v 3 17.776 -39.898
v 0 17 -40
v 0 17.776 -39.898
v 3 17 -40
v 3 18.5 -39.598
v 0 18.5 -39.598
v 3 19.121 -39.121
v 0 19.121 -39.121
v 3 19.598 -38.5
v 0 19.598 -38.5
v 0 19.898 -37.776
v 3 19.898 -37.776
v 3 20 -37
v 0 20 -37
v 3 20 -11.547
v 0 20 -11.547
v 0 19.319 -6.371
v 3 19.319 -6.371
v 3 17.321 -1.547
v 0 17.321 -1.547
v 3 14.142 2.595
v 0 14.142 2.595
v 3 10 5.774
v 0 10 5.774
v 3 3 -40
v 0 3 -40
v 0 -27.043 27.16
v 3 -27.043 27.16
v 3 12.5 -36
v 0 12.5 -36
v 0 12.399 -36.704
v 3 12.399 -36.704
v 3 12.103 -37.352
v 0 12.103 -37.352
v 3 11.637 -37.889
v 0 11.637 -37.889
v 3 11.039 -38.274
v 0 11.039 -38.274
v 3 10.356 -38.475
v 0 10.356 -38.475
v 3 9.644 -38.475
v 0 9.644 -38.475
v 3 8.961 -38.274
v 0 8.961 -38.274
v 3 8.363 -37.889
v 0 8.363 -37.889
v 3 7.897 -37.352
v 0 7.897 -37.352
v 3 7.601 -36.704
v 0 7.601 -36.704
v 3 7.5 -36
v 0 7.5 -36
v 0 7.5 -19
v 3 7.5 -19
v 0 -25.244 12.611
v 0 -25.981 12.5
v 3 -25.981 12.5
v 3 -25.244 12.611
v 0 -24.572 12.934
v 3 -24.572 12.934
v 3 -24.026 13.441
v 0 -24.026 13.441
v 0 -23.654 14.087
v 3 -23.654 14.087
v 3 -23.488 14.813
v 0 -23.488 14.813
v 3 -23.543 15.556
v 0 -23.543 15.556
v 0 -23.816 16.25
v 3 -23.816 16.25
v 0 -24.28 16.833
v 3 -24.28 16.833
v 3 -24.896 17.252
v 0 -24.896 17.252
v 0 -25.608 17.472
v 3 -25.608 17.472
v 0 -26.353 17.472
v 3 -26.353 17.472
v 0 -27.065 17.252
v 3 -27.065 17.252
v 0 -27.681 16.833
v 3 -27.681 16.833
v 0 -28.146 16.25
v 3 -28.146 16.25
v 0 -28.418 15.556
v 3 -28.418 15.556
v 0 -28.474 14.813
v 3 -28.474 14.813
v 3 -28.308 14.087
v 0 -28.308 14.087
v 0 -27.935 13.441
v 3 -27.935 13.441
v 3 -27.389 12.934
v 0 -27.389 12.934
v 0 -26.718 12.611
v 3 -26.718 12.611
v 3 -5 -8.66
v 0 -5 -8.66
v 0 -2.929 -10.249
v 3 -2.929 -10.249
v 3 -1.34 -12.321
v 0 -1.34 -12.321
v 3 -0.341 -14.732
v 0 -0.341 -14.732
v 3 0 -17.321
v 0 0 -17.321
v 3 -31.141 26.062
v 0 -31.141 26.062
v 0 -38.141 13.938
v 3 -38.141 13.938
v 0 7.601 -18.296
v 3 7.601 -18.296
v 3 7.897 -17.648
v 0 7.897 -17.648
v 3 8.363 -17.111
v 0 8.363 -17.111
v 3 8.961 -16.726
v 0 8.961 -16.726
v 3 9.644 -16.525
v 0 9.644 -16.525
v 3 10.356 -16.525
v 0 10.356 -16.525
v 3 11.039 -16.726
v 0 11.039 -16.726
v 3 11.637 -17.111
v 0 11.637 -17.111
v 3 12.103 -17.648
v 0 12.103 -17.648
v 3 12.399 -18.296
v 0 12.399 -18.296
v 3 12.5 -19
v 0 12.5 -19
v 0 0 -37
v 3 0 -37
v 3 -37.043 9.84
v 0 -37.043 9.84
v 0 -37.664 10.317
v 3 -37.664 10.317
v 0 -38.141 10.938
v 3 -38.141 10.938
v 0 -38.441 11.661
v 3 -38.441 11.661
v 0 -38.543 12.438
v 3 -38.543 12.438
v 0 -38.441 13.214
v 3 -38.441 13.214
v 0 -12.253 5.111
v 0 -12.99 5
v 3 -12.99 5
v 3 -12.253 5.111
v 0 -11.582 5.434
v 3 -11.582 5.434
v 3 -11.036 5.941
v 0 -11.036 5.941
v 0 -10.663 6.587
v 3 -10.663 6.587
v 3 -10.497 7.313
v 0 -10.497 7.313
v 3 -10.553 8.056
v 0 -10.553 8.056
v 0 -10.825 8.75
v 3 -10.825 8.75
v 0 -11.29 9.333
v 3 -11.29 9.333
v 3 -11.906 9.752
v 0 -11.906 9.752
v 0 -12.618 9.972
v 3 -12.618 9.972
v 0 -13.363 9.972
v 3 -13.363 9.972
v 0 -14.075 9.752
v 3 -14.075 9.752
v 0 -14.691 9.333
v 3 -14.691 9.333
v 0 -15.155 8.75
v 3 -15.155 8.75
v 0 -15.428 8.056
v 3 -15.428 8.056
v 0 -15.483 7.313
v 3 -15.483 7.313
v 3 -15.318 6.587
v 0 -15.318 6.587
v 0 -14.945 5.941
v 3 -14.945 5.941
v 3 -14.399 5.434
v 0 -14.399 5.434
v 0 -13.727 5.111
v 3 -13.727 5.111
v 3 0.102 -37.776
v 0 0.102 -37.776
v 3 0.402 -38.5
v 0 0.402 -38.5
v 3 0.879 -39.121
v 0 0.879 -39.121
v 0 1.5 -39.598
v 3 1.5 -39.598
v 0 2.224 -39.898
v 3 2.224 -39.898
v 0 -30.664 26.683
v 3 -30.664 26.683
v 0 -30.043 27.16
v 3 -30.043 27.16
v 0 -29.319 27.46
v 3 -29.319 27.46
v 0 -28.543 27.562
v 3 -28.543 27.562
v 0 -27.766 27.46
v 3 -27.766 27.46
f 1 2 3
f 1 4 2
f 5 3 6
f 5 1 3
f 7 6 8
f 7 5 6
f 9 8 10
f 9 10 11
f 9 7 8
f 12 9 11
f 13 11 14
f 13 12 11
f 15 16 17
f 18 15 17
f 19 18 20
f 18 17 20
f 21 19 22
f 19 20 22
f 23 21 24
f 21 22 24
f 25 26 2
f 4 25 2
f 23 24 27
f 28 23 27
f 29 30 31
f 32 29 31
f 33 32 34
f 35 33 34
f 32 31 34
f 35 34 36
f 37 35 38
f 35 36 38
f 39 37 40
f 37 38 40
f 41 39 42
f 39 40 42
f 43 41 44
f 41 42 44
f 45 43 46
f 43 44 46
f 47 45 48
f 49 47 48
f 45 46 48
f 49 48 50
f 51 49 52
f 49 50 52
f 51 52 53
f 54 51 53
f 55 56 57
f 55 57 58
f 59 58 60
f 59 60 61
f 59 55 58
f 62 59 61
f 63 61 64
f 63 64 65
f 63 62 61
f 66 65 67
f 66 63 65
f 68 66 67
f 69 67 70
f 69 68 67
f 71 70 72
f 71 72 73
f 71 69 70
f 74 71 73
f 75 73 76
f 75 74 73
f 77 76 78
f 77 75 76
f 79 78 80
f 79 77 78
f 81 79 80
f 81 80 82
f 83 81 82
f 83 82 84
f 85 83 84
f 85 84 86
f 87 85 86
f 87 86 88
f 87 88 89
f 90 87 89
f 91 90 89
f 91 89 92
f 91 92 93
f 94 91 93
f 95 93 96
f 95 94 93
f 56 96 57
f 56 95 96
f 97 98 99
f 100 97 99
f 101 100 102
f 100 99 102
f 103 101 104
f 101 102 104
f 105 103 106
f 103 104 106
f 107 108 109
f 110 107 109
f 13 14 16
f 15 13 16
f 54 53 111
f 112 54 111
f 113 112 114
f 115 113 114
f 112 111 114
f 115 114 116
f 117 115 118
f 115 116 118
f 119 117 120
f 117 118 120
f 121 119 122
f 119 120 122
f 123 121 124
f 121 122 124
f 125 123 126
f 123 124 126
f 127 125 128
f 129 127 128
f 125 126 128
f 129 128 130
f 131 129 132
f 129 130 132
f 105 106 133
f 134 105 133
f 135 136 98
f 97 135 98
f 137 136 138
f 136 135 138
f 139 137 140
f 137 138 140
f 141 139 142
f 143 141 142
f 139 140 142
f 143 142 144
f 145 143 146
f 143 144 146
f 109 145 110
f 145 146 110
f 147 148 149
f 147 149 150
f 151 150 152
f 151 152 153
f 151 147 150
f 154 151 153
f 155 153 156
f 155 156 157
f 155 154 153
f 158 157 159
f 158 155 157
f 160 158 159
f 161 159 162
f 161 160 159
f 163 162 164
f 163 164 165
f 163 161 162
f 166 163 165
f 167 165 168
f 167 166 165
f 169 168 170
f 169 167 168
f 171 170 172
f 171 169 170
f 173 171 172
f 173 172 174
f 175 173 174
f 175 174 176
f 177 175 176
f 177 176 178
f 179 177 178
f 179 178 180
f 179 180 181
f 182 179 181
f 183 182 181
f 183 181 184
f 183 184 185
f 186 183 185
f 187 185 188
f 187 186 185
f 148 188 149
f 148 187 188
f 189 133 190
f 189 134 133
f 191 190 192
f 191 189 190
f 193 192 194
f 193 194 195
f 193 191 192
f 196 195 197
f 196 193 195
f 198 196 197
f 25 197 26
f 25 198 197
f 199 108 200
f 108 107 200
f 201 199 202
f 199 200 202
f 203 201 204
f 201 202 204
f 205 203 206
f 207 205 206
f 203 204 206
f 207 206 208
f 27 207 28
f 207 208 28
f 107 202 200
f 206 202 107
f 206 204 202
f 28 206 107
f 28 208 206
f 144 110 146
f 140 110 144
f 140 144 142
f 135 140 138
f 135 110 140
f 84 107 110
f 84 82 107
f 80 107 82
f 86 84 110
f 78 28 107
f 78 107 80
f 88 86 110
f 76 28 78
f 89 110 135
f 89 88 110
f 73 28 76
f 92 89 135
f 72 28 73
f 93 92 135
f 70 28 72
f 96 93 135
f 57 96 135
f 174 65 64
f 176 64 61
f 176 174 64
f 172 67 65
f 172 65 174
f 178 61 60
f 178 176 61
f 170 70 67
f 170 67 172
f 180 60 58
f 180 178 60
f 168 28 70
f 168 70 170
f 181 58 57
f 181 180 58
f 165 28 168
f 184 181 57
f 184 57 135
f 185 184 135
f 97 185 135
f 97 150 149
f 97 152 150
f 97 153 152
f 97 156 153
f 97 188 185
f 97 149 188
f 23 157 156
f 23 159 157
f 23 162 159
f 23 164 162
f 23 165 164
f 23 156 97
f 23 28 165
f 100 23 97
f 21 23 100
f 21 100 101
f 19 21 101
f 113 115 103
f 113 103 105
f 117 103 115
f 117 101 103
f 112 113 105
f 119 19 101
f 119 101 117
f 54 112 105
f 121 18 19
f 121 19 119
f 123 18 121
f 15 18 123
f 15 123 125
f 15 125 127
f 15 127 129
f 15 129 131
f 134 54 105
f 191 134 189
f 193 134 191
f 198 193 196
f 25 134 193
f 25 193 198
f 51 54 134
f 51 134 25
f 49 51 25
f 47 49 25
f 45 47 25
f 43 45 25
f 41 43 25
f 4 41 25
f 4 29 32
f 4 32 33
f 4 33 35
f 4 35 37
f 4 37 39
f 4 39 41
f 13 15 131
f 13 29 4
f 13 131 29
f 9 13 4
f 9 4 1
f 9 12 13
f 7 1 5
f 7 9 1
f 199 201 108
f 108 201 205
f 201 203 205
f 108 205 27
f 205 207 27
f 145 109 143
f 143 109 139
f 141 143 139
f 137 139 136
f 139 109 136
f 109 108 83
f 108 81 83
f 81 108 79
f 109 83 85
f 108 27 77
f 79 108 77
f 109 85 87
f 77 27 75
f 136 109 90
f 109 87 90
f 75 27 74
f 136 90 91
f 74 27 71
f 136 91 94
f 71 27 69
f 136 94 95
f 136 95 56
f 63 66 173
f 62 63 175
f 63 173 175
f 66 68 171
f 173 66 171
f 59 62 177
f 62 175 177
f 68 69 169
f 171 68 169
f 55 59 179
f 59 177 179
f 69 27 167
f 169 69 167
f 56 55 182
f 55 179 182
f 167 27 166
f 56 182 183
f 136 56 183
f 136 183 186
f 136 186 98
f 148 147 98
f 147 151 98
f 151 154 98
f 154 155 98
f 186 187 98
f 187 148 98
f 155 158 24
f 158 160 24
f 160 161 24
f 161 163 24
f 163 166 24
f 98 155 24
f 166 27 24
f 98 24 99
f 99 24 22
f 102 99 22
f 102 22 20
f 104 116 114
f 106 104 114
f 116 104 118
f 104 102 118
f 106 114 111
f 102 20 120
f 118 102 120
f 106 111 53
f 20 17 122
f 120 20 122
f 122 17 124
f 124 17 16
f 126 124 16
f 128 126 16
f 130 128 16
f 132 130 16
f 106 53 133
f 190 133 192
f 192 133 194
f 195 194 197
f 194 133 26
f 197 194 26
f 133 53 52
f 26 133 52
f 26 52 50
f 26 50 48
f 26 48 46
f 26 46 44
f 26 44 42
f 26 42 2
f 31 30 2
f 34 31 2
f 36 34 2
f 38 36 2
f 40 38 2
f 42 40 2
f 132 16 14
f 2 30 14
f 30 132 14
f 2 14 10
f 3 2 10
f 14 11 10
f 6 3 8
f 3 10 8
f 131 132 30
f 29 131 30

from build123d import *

# Parameters (mm, degrees)
SKETCH1_R           = 2.5
BOSS_EXTRUDE1_DEPTH = 3
FILLET1_R           = 3


with BuildPart() as part:
    # Sketch1 → Boss-Extrude1 (new body)
    with BuildSketch(Plane(origin=(0, 0, 0), x_dir=(0, 0, -1), z_dir=(1, 0, 0))):
        with BuildLine():
            Line((17.320508076, 0), (40, 0))
            Line((40, 0), (40, 20))
            Line((40, 20), (11.547005384, 20))
            ThreePointArc((11.547005384, 20), (1.547005384, 17.320508076), (-5.773502692, 10))
            Line((-5.773502692, 10), (-28.660254038, -29.641016151))
            Line((-28.660254038, -29.641016151), (-11.339745962, -39.641016151))
            Line((-11.339745962, -39.641016151), (8.660254038, -5))
            ThreePointArc((8.660254038, -5), (12.320508076, -1.339745962), (17.320508076, 0))
        make_face()
        with Locations((-15, -25.980762114)):
            Circle(SKETCH1_R, mode=Mode.SUBTRACT)
        with Locations((-7.5, -12.990381057)):
            Circle(SKETCH1_R, mode=Mode.SUBTRACT)
        with BuildLine():
            Line((19, 12.5), (36, 12.5))
            ThreePointArc((36, 12.5), (38.5, 10), (36, 7.5))
            Line((36, 7.5), (19, 7.5))
            ThreePointArc((19, 7.5), (16.5, 10), (19, 12.5))
        make_face(mode=Mode.SUBTRACT)
    extrude(amount=BOSS_EXTRUDE1_DEPTH)

    # Fillet1
    fillet1_edges = [part.edges().sort_by_distance(p)[0] for p in [
        (1.5, 0, -40),
        (1.5, -39.641016151, 11.339745962),
        (1.5, -29.641016151, 28.660254038),
        (1.5, 20, -40),
    ]]
    fillet(fillet1_edges, radius=FILLET1_R)


solid = part.part
